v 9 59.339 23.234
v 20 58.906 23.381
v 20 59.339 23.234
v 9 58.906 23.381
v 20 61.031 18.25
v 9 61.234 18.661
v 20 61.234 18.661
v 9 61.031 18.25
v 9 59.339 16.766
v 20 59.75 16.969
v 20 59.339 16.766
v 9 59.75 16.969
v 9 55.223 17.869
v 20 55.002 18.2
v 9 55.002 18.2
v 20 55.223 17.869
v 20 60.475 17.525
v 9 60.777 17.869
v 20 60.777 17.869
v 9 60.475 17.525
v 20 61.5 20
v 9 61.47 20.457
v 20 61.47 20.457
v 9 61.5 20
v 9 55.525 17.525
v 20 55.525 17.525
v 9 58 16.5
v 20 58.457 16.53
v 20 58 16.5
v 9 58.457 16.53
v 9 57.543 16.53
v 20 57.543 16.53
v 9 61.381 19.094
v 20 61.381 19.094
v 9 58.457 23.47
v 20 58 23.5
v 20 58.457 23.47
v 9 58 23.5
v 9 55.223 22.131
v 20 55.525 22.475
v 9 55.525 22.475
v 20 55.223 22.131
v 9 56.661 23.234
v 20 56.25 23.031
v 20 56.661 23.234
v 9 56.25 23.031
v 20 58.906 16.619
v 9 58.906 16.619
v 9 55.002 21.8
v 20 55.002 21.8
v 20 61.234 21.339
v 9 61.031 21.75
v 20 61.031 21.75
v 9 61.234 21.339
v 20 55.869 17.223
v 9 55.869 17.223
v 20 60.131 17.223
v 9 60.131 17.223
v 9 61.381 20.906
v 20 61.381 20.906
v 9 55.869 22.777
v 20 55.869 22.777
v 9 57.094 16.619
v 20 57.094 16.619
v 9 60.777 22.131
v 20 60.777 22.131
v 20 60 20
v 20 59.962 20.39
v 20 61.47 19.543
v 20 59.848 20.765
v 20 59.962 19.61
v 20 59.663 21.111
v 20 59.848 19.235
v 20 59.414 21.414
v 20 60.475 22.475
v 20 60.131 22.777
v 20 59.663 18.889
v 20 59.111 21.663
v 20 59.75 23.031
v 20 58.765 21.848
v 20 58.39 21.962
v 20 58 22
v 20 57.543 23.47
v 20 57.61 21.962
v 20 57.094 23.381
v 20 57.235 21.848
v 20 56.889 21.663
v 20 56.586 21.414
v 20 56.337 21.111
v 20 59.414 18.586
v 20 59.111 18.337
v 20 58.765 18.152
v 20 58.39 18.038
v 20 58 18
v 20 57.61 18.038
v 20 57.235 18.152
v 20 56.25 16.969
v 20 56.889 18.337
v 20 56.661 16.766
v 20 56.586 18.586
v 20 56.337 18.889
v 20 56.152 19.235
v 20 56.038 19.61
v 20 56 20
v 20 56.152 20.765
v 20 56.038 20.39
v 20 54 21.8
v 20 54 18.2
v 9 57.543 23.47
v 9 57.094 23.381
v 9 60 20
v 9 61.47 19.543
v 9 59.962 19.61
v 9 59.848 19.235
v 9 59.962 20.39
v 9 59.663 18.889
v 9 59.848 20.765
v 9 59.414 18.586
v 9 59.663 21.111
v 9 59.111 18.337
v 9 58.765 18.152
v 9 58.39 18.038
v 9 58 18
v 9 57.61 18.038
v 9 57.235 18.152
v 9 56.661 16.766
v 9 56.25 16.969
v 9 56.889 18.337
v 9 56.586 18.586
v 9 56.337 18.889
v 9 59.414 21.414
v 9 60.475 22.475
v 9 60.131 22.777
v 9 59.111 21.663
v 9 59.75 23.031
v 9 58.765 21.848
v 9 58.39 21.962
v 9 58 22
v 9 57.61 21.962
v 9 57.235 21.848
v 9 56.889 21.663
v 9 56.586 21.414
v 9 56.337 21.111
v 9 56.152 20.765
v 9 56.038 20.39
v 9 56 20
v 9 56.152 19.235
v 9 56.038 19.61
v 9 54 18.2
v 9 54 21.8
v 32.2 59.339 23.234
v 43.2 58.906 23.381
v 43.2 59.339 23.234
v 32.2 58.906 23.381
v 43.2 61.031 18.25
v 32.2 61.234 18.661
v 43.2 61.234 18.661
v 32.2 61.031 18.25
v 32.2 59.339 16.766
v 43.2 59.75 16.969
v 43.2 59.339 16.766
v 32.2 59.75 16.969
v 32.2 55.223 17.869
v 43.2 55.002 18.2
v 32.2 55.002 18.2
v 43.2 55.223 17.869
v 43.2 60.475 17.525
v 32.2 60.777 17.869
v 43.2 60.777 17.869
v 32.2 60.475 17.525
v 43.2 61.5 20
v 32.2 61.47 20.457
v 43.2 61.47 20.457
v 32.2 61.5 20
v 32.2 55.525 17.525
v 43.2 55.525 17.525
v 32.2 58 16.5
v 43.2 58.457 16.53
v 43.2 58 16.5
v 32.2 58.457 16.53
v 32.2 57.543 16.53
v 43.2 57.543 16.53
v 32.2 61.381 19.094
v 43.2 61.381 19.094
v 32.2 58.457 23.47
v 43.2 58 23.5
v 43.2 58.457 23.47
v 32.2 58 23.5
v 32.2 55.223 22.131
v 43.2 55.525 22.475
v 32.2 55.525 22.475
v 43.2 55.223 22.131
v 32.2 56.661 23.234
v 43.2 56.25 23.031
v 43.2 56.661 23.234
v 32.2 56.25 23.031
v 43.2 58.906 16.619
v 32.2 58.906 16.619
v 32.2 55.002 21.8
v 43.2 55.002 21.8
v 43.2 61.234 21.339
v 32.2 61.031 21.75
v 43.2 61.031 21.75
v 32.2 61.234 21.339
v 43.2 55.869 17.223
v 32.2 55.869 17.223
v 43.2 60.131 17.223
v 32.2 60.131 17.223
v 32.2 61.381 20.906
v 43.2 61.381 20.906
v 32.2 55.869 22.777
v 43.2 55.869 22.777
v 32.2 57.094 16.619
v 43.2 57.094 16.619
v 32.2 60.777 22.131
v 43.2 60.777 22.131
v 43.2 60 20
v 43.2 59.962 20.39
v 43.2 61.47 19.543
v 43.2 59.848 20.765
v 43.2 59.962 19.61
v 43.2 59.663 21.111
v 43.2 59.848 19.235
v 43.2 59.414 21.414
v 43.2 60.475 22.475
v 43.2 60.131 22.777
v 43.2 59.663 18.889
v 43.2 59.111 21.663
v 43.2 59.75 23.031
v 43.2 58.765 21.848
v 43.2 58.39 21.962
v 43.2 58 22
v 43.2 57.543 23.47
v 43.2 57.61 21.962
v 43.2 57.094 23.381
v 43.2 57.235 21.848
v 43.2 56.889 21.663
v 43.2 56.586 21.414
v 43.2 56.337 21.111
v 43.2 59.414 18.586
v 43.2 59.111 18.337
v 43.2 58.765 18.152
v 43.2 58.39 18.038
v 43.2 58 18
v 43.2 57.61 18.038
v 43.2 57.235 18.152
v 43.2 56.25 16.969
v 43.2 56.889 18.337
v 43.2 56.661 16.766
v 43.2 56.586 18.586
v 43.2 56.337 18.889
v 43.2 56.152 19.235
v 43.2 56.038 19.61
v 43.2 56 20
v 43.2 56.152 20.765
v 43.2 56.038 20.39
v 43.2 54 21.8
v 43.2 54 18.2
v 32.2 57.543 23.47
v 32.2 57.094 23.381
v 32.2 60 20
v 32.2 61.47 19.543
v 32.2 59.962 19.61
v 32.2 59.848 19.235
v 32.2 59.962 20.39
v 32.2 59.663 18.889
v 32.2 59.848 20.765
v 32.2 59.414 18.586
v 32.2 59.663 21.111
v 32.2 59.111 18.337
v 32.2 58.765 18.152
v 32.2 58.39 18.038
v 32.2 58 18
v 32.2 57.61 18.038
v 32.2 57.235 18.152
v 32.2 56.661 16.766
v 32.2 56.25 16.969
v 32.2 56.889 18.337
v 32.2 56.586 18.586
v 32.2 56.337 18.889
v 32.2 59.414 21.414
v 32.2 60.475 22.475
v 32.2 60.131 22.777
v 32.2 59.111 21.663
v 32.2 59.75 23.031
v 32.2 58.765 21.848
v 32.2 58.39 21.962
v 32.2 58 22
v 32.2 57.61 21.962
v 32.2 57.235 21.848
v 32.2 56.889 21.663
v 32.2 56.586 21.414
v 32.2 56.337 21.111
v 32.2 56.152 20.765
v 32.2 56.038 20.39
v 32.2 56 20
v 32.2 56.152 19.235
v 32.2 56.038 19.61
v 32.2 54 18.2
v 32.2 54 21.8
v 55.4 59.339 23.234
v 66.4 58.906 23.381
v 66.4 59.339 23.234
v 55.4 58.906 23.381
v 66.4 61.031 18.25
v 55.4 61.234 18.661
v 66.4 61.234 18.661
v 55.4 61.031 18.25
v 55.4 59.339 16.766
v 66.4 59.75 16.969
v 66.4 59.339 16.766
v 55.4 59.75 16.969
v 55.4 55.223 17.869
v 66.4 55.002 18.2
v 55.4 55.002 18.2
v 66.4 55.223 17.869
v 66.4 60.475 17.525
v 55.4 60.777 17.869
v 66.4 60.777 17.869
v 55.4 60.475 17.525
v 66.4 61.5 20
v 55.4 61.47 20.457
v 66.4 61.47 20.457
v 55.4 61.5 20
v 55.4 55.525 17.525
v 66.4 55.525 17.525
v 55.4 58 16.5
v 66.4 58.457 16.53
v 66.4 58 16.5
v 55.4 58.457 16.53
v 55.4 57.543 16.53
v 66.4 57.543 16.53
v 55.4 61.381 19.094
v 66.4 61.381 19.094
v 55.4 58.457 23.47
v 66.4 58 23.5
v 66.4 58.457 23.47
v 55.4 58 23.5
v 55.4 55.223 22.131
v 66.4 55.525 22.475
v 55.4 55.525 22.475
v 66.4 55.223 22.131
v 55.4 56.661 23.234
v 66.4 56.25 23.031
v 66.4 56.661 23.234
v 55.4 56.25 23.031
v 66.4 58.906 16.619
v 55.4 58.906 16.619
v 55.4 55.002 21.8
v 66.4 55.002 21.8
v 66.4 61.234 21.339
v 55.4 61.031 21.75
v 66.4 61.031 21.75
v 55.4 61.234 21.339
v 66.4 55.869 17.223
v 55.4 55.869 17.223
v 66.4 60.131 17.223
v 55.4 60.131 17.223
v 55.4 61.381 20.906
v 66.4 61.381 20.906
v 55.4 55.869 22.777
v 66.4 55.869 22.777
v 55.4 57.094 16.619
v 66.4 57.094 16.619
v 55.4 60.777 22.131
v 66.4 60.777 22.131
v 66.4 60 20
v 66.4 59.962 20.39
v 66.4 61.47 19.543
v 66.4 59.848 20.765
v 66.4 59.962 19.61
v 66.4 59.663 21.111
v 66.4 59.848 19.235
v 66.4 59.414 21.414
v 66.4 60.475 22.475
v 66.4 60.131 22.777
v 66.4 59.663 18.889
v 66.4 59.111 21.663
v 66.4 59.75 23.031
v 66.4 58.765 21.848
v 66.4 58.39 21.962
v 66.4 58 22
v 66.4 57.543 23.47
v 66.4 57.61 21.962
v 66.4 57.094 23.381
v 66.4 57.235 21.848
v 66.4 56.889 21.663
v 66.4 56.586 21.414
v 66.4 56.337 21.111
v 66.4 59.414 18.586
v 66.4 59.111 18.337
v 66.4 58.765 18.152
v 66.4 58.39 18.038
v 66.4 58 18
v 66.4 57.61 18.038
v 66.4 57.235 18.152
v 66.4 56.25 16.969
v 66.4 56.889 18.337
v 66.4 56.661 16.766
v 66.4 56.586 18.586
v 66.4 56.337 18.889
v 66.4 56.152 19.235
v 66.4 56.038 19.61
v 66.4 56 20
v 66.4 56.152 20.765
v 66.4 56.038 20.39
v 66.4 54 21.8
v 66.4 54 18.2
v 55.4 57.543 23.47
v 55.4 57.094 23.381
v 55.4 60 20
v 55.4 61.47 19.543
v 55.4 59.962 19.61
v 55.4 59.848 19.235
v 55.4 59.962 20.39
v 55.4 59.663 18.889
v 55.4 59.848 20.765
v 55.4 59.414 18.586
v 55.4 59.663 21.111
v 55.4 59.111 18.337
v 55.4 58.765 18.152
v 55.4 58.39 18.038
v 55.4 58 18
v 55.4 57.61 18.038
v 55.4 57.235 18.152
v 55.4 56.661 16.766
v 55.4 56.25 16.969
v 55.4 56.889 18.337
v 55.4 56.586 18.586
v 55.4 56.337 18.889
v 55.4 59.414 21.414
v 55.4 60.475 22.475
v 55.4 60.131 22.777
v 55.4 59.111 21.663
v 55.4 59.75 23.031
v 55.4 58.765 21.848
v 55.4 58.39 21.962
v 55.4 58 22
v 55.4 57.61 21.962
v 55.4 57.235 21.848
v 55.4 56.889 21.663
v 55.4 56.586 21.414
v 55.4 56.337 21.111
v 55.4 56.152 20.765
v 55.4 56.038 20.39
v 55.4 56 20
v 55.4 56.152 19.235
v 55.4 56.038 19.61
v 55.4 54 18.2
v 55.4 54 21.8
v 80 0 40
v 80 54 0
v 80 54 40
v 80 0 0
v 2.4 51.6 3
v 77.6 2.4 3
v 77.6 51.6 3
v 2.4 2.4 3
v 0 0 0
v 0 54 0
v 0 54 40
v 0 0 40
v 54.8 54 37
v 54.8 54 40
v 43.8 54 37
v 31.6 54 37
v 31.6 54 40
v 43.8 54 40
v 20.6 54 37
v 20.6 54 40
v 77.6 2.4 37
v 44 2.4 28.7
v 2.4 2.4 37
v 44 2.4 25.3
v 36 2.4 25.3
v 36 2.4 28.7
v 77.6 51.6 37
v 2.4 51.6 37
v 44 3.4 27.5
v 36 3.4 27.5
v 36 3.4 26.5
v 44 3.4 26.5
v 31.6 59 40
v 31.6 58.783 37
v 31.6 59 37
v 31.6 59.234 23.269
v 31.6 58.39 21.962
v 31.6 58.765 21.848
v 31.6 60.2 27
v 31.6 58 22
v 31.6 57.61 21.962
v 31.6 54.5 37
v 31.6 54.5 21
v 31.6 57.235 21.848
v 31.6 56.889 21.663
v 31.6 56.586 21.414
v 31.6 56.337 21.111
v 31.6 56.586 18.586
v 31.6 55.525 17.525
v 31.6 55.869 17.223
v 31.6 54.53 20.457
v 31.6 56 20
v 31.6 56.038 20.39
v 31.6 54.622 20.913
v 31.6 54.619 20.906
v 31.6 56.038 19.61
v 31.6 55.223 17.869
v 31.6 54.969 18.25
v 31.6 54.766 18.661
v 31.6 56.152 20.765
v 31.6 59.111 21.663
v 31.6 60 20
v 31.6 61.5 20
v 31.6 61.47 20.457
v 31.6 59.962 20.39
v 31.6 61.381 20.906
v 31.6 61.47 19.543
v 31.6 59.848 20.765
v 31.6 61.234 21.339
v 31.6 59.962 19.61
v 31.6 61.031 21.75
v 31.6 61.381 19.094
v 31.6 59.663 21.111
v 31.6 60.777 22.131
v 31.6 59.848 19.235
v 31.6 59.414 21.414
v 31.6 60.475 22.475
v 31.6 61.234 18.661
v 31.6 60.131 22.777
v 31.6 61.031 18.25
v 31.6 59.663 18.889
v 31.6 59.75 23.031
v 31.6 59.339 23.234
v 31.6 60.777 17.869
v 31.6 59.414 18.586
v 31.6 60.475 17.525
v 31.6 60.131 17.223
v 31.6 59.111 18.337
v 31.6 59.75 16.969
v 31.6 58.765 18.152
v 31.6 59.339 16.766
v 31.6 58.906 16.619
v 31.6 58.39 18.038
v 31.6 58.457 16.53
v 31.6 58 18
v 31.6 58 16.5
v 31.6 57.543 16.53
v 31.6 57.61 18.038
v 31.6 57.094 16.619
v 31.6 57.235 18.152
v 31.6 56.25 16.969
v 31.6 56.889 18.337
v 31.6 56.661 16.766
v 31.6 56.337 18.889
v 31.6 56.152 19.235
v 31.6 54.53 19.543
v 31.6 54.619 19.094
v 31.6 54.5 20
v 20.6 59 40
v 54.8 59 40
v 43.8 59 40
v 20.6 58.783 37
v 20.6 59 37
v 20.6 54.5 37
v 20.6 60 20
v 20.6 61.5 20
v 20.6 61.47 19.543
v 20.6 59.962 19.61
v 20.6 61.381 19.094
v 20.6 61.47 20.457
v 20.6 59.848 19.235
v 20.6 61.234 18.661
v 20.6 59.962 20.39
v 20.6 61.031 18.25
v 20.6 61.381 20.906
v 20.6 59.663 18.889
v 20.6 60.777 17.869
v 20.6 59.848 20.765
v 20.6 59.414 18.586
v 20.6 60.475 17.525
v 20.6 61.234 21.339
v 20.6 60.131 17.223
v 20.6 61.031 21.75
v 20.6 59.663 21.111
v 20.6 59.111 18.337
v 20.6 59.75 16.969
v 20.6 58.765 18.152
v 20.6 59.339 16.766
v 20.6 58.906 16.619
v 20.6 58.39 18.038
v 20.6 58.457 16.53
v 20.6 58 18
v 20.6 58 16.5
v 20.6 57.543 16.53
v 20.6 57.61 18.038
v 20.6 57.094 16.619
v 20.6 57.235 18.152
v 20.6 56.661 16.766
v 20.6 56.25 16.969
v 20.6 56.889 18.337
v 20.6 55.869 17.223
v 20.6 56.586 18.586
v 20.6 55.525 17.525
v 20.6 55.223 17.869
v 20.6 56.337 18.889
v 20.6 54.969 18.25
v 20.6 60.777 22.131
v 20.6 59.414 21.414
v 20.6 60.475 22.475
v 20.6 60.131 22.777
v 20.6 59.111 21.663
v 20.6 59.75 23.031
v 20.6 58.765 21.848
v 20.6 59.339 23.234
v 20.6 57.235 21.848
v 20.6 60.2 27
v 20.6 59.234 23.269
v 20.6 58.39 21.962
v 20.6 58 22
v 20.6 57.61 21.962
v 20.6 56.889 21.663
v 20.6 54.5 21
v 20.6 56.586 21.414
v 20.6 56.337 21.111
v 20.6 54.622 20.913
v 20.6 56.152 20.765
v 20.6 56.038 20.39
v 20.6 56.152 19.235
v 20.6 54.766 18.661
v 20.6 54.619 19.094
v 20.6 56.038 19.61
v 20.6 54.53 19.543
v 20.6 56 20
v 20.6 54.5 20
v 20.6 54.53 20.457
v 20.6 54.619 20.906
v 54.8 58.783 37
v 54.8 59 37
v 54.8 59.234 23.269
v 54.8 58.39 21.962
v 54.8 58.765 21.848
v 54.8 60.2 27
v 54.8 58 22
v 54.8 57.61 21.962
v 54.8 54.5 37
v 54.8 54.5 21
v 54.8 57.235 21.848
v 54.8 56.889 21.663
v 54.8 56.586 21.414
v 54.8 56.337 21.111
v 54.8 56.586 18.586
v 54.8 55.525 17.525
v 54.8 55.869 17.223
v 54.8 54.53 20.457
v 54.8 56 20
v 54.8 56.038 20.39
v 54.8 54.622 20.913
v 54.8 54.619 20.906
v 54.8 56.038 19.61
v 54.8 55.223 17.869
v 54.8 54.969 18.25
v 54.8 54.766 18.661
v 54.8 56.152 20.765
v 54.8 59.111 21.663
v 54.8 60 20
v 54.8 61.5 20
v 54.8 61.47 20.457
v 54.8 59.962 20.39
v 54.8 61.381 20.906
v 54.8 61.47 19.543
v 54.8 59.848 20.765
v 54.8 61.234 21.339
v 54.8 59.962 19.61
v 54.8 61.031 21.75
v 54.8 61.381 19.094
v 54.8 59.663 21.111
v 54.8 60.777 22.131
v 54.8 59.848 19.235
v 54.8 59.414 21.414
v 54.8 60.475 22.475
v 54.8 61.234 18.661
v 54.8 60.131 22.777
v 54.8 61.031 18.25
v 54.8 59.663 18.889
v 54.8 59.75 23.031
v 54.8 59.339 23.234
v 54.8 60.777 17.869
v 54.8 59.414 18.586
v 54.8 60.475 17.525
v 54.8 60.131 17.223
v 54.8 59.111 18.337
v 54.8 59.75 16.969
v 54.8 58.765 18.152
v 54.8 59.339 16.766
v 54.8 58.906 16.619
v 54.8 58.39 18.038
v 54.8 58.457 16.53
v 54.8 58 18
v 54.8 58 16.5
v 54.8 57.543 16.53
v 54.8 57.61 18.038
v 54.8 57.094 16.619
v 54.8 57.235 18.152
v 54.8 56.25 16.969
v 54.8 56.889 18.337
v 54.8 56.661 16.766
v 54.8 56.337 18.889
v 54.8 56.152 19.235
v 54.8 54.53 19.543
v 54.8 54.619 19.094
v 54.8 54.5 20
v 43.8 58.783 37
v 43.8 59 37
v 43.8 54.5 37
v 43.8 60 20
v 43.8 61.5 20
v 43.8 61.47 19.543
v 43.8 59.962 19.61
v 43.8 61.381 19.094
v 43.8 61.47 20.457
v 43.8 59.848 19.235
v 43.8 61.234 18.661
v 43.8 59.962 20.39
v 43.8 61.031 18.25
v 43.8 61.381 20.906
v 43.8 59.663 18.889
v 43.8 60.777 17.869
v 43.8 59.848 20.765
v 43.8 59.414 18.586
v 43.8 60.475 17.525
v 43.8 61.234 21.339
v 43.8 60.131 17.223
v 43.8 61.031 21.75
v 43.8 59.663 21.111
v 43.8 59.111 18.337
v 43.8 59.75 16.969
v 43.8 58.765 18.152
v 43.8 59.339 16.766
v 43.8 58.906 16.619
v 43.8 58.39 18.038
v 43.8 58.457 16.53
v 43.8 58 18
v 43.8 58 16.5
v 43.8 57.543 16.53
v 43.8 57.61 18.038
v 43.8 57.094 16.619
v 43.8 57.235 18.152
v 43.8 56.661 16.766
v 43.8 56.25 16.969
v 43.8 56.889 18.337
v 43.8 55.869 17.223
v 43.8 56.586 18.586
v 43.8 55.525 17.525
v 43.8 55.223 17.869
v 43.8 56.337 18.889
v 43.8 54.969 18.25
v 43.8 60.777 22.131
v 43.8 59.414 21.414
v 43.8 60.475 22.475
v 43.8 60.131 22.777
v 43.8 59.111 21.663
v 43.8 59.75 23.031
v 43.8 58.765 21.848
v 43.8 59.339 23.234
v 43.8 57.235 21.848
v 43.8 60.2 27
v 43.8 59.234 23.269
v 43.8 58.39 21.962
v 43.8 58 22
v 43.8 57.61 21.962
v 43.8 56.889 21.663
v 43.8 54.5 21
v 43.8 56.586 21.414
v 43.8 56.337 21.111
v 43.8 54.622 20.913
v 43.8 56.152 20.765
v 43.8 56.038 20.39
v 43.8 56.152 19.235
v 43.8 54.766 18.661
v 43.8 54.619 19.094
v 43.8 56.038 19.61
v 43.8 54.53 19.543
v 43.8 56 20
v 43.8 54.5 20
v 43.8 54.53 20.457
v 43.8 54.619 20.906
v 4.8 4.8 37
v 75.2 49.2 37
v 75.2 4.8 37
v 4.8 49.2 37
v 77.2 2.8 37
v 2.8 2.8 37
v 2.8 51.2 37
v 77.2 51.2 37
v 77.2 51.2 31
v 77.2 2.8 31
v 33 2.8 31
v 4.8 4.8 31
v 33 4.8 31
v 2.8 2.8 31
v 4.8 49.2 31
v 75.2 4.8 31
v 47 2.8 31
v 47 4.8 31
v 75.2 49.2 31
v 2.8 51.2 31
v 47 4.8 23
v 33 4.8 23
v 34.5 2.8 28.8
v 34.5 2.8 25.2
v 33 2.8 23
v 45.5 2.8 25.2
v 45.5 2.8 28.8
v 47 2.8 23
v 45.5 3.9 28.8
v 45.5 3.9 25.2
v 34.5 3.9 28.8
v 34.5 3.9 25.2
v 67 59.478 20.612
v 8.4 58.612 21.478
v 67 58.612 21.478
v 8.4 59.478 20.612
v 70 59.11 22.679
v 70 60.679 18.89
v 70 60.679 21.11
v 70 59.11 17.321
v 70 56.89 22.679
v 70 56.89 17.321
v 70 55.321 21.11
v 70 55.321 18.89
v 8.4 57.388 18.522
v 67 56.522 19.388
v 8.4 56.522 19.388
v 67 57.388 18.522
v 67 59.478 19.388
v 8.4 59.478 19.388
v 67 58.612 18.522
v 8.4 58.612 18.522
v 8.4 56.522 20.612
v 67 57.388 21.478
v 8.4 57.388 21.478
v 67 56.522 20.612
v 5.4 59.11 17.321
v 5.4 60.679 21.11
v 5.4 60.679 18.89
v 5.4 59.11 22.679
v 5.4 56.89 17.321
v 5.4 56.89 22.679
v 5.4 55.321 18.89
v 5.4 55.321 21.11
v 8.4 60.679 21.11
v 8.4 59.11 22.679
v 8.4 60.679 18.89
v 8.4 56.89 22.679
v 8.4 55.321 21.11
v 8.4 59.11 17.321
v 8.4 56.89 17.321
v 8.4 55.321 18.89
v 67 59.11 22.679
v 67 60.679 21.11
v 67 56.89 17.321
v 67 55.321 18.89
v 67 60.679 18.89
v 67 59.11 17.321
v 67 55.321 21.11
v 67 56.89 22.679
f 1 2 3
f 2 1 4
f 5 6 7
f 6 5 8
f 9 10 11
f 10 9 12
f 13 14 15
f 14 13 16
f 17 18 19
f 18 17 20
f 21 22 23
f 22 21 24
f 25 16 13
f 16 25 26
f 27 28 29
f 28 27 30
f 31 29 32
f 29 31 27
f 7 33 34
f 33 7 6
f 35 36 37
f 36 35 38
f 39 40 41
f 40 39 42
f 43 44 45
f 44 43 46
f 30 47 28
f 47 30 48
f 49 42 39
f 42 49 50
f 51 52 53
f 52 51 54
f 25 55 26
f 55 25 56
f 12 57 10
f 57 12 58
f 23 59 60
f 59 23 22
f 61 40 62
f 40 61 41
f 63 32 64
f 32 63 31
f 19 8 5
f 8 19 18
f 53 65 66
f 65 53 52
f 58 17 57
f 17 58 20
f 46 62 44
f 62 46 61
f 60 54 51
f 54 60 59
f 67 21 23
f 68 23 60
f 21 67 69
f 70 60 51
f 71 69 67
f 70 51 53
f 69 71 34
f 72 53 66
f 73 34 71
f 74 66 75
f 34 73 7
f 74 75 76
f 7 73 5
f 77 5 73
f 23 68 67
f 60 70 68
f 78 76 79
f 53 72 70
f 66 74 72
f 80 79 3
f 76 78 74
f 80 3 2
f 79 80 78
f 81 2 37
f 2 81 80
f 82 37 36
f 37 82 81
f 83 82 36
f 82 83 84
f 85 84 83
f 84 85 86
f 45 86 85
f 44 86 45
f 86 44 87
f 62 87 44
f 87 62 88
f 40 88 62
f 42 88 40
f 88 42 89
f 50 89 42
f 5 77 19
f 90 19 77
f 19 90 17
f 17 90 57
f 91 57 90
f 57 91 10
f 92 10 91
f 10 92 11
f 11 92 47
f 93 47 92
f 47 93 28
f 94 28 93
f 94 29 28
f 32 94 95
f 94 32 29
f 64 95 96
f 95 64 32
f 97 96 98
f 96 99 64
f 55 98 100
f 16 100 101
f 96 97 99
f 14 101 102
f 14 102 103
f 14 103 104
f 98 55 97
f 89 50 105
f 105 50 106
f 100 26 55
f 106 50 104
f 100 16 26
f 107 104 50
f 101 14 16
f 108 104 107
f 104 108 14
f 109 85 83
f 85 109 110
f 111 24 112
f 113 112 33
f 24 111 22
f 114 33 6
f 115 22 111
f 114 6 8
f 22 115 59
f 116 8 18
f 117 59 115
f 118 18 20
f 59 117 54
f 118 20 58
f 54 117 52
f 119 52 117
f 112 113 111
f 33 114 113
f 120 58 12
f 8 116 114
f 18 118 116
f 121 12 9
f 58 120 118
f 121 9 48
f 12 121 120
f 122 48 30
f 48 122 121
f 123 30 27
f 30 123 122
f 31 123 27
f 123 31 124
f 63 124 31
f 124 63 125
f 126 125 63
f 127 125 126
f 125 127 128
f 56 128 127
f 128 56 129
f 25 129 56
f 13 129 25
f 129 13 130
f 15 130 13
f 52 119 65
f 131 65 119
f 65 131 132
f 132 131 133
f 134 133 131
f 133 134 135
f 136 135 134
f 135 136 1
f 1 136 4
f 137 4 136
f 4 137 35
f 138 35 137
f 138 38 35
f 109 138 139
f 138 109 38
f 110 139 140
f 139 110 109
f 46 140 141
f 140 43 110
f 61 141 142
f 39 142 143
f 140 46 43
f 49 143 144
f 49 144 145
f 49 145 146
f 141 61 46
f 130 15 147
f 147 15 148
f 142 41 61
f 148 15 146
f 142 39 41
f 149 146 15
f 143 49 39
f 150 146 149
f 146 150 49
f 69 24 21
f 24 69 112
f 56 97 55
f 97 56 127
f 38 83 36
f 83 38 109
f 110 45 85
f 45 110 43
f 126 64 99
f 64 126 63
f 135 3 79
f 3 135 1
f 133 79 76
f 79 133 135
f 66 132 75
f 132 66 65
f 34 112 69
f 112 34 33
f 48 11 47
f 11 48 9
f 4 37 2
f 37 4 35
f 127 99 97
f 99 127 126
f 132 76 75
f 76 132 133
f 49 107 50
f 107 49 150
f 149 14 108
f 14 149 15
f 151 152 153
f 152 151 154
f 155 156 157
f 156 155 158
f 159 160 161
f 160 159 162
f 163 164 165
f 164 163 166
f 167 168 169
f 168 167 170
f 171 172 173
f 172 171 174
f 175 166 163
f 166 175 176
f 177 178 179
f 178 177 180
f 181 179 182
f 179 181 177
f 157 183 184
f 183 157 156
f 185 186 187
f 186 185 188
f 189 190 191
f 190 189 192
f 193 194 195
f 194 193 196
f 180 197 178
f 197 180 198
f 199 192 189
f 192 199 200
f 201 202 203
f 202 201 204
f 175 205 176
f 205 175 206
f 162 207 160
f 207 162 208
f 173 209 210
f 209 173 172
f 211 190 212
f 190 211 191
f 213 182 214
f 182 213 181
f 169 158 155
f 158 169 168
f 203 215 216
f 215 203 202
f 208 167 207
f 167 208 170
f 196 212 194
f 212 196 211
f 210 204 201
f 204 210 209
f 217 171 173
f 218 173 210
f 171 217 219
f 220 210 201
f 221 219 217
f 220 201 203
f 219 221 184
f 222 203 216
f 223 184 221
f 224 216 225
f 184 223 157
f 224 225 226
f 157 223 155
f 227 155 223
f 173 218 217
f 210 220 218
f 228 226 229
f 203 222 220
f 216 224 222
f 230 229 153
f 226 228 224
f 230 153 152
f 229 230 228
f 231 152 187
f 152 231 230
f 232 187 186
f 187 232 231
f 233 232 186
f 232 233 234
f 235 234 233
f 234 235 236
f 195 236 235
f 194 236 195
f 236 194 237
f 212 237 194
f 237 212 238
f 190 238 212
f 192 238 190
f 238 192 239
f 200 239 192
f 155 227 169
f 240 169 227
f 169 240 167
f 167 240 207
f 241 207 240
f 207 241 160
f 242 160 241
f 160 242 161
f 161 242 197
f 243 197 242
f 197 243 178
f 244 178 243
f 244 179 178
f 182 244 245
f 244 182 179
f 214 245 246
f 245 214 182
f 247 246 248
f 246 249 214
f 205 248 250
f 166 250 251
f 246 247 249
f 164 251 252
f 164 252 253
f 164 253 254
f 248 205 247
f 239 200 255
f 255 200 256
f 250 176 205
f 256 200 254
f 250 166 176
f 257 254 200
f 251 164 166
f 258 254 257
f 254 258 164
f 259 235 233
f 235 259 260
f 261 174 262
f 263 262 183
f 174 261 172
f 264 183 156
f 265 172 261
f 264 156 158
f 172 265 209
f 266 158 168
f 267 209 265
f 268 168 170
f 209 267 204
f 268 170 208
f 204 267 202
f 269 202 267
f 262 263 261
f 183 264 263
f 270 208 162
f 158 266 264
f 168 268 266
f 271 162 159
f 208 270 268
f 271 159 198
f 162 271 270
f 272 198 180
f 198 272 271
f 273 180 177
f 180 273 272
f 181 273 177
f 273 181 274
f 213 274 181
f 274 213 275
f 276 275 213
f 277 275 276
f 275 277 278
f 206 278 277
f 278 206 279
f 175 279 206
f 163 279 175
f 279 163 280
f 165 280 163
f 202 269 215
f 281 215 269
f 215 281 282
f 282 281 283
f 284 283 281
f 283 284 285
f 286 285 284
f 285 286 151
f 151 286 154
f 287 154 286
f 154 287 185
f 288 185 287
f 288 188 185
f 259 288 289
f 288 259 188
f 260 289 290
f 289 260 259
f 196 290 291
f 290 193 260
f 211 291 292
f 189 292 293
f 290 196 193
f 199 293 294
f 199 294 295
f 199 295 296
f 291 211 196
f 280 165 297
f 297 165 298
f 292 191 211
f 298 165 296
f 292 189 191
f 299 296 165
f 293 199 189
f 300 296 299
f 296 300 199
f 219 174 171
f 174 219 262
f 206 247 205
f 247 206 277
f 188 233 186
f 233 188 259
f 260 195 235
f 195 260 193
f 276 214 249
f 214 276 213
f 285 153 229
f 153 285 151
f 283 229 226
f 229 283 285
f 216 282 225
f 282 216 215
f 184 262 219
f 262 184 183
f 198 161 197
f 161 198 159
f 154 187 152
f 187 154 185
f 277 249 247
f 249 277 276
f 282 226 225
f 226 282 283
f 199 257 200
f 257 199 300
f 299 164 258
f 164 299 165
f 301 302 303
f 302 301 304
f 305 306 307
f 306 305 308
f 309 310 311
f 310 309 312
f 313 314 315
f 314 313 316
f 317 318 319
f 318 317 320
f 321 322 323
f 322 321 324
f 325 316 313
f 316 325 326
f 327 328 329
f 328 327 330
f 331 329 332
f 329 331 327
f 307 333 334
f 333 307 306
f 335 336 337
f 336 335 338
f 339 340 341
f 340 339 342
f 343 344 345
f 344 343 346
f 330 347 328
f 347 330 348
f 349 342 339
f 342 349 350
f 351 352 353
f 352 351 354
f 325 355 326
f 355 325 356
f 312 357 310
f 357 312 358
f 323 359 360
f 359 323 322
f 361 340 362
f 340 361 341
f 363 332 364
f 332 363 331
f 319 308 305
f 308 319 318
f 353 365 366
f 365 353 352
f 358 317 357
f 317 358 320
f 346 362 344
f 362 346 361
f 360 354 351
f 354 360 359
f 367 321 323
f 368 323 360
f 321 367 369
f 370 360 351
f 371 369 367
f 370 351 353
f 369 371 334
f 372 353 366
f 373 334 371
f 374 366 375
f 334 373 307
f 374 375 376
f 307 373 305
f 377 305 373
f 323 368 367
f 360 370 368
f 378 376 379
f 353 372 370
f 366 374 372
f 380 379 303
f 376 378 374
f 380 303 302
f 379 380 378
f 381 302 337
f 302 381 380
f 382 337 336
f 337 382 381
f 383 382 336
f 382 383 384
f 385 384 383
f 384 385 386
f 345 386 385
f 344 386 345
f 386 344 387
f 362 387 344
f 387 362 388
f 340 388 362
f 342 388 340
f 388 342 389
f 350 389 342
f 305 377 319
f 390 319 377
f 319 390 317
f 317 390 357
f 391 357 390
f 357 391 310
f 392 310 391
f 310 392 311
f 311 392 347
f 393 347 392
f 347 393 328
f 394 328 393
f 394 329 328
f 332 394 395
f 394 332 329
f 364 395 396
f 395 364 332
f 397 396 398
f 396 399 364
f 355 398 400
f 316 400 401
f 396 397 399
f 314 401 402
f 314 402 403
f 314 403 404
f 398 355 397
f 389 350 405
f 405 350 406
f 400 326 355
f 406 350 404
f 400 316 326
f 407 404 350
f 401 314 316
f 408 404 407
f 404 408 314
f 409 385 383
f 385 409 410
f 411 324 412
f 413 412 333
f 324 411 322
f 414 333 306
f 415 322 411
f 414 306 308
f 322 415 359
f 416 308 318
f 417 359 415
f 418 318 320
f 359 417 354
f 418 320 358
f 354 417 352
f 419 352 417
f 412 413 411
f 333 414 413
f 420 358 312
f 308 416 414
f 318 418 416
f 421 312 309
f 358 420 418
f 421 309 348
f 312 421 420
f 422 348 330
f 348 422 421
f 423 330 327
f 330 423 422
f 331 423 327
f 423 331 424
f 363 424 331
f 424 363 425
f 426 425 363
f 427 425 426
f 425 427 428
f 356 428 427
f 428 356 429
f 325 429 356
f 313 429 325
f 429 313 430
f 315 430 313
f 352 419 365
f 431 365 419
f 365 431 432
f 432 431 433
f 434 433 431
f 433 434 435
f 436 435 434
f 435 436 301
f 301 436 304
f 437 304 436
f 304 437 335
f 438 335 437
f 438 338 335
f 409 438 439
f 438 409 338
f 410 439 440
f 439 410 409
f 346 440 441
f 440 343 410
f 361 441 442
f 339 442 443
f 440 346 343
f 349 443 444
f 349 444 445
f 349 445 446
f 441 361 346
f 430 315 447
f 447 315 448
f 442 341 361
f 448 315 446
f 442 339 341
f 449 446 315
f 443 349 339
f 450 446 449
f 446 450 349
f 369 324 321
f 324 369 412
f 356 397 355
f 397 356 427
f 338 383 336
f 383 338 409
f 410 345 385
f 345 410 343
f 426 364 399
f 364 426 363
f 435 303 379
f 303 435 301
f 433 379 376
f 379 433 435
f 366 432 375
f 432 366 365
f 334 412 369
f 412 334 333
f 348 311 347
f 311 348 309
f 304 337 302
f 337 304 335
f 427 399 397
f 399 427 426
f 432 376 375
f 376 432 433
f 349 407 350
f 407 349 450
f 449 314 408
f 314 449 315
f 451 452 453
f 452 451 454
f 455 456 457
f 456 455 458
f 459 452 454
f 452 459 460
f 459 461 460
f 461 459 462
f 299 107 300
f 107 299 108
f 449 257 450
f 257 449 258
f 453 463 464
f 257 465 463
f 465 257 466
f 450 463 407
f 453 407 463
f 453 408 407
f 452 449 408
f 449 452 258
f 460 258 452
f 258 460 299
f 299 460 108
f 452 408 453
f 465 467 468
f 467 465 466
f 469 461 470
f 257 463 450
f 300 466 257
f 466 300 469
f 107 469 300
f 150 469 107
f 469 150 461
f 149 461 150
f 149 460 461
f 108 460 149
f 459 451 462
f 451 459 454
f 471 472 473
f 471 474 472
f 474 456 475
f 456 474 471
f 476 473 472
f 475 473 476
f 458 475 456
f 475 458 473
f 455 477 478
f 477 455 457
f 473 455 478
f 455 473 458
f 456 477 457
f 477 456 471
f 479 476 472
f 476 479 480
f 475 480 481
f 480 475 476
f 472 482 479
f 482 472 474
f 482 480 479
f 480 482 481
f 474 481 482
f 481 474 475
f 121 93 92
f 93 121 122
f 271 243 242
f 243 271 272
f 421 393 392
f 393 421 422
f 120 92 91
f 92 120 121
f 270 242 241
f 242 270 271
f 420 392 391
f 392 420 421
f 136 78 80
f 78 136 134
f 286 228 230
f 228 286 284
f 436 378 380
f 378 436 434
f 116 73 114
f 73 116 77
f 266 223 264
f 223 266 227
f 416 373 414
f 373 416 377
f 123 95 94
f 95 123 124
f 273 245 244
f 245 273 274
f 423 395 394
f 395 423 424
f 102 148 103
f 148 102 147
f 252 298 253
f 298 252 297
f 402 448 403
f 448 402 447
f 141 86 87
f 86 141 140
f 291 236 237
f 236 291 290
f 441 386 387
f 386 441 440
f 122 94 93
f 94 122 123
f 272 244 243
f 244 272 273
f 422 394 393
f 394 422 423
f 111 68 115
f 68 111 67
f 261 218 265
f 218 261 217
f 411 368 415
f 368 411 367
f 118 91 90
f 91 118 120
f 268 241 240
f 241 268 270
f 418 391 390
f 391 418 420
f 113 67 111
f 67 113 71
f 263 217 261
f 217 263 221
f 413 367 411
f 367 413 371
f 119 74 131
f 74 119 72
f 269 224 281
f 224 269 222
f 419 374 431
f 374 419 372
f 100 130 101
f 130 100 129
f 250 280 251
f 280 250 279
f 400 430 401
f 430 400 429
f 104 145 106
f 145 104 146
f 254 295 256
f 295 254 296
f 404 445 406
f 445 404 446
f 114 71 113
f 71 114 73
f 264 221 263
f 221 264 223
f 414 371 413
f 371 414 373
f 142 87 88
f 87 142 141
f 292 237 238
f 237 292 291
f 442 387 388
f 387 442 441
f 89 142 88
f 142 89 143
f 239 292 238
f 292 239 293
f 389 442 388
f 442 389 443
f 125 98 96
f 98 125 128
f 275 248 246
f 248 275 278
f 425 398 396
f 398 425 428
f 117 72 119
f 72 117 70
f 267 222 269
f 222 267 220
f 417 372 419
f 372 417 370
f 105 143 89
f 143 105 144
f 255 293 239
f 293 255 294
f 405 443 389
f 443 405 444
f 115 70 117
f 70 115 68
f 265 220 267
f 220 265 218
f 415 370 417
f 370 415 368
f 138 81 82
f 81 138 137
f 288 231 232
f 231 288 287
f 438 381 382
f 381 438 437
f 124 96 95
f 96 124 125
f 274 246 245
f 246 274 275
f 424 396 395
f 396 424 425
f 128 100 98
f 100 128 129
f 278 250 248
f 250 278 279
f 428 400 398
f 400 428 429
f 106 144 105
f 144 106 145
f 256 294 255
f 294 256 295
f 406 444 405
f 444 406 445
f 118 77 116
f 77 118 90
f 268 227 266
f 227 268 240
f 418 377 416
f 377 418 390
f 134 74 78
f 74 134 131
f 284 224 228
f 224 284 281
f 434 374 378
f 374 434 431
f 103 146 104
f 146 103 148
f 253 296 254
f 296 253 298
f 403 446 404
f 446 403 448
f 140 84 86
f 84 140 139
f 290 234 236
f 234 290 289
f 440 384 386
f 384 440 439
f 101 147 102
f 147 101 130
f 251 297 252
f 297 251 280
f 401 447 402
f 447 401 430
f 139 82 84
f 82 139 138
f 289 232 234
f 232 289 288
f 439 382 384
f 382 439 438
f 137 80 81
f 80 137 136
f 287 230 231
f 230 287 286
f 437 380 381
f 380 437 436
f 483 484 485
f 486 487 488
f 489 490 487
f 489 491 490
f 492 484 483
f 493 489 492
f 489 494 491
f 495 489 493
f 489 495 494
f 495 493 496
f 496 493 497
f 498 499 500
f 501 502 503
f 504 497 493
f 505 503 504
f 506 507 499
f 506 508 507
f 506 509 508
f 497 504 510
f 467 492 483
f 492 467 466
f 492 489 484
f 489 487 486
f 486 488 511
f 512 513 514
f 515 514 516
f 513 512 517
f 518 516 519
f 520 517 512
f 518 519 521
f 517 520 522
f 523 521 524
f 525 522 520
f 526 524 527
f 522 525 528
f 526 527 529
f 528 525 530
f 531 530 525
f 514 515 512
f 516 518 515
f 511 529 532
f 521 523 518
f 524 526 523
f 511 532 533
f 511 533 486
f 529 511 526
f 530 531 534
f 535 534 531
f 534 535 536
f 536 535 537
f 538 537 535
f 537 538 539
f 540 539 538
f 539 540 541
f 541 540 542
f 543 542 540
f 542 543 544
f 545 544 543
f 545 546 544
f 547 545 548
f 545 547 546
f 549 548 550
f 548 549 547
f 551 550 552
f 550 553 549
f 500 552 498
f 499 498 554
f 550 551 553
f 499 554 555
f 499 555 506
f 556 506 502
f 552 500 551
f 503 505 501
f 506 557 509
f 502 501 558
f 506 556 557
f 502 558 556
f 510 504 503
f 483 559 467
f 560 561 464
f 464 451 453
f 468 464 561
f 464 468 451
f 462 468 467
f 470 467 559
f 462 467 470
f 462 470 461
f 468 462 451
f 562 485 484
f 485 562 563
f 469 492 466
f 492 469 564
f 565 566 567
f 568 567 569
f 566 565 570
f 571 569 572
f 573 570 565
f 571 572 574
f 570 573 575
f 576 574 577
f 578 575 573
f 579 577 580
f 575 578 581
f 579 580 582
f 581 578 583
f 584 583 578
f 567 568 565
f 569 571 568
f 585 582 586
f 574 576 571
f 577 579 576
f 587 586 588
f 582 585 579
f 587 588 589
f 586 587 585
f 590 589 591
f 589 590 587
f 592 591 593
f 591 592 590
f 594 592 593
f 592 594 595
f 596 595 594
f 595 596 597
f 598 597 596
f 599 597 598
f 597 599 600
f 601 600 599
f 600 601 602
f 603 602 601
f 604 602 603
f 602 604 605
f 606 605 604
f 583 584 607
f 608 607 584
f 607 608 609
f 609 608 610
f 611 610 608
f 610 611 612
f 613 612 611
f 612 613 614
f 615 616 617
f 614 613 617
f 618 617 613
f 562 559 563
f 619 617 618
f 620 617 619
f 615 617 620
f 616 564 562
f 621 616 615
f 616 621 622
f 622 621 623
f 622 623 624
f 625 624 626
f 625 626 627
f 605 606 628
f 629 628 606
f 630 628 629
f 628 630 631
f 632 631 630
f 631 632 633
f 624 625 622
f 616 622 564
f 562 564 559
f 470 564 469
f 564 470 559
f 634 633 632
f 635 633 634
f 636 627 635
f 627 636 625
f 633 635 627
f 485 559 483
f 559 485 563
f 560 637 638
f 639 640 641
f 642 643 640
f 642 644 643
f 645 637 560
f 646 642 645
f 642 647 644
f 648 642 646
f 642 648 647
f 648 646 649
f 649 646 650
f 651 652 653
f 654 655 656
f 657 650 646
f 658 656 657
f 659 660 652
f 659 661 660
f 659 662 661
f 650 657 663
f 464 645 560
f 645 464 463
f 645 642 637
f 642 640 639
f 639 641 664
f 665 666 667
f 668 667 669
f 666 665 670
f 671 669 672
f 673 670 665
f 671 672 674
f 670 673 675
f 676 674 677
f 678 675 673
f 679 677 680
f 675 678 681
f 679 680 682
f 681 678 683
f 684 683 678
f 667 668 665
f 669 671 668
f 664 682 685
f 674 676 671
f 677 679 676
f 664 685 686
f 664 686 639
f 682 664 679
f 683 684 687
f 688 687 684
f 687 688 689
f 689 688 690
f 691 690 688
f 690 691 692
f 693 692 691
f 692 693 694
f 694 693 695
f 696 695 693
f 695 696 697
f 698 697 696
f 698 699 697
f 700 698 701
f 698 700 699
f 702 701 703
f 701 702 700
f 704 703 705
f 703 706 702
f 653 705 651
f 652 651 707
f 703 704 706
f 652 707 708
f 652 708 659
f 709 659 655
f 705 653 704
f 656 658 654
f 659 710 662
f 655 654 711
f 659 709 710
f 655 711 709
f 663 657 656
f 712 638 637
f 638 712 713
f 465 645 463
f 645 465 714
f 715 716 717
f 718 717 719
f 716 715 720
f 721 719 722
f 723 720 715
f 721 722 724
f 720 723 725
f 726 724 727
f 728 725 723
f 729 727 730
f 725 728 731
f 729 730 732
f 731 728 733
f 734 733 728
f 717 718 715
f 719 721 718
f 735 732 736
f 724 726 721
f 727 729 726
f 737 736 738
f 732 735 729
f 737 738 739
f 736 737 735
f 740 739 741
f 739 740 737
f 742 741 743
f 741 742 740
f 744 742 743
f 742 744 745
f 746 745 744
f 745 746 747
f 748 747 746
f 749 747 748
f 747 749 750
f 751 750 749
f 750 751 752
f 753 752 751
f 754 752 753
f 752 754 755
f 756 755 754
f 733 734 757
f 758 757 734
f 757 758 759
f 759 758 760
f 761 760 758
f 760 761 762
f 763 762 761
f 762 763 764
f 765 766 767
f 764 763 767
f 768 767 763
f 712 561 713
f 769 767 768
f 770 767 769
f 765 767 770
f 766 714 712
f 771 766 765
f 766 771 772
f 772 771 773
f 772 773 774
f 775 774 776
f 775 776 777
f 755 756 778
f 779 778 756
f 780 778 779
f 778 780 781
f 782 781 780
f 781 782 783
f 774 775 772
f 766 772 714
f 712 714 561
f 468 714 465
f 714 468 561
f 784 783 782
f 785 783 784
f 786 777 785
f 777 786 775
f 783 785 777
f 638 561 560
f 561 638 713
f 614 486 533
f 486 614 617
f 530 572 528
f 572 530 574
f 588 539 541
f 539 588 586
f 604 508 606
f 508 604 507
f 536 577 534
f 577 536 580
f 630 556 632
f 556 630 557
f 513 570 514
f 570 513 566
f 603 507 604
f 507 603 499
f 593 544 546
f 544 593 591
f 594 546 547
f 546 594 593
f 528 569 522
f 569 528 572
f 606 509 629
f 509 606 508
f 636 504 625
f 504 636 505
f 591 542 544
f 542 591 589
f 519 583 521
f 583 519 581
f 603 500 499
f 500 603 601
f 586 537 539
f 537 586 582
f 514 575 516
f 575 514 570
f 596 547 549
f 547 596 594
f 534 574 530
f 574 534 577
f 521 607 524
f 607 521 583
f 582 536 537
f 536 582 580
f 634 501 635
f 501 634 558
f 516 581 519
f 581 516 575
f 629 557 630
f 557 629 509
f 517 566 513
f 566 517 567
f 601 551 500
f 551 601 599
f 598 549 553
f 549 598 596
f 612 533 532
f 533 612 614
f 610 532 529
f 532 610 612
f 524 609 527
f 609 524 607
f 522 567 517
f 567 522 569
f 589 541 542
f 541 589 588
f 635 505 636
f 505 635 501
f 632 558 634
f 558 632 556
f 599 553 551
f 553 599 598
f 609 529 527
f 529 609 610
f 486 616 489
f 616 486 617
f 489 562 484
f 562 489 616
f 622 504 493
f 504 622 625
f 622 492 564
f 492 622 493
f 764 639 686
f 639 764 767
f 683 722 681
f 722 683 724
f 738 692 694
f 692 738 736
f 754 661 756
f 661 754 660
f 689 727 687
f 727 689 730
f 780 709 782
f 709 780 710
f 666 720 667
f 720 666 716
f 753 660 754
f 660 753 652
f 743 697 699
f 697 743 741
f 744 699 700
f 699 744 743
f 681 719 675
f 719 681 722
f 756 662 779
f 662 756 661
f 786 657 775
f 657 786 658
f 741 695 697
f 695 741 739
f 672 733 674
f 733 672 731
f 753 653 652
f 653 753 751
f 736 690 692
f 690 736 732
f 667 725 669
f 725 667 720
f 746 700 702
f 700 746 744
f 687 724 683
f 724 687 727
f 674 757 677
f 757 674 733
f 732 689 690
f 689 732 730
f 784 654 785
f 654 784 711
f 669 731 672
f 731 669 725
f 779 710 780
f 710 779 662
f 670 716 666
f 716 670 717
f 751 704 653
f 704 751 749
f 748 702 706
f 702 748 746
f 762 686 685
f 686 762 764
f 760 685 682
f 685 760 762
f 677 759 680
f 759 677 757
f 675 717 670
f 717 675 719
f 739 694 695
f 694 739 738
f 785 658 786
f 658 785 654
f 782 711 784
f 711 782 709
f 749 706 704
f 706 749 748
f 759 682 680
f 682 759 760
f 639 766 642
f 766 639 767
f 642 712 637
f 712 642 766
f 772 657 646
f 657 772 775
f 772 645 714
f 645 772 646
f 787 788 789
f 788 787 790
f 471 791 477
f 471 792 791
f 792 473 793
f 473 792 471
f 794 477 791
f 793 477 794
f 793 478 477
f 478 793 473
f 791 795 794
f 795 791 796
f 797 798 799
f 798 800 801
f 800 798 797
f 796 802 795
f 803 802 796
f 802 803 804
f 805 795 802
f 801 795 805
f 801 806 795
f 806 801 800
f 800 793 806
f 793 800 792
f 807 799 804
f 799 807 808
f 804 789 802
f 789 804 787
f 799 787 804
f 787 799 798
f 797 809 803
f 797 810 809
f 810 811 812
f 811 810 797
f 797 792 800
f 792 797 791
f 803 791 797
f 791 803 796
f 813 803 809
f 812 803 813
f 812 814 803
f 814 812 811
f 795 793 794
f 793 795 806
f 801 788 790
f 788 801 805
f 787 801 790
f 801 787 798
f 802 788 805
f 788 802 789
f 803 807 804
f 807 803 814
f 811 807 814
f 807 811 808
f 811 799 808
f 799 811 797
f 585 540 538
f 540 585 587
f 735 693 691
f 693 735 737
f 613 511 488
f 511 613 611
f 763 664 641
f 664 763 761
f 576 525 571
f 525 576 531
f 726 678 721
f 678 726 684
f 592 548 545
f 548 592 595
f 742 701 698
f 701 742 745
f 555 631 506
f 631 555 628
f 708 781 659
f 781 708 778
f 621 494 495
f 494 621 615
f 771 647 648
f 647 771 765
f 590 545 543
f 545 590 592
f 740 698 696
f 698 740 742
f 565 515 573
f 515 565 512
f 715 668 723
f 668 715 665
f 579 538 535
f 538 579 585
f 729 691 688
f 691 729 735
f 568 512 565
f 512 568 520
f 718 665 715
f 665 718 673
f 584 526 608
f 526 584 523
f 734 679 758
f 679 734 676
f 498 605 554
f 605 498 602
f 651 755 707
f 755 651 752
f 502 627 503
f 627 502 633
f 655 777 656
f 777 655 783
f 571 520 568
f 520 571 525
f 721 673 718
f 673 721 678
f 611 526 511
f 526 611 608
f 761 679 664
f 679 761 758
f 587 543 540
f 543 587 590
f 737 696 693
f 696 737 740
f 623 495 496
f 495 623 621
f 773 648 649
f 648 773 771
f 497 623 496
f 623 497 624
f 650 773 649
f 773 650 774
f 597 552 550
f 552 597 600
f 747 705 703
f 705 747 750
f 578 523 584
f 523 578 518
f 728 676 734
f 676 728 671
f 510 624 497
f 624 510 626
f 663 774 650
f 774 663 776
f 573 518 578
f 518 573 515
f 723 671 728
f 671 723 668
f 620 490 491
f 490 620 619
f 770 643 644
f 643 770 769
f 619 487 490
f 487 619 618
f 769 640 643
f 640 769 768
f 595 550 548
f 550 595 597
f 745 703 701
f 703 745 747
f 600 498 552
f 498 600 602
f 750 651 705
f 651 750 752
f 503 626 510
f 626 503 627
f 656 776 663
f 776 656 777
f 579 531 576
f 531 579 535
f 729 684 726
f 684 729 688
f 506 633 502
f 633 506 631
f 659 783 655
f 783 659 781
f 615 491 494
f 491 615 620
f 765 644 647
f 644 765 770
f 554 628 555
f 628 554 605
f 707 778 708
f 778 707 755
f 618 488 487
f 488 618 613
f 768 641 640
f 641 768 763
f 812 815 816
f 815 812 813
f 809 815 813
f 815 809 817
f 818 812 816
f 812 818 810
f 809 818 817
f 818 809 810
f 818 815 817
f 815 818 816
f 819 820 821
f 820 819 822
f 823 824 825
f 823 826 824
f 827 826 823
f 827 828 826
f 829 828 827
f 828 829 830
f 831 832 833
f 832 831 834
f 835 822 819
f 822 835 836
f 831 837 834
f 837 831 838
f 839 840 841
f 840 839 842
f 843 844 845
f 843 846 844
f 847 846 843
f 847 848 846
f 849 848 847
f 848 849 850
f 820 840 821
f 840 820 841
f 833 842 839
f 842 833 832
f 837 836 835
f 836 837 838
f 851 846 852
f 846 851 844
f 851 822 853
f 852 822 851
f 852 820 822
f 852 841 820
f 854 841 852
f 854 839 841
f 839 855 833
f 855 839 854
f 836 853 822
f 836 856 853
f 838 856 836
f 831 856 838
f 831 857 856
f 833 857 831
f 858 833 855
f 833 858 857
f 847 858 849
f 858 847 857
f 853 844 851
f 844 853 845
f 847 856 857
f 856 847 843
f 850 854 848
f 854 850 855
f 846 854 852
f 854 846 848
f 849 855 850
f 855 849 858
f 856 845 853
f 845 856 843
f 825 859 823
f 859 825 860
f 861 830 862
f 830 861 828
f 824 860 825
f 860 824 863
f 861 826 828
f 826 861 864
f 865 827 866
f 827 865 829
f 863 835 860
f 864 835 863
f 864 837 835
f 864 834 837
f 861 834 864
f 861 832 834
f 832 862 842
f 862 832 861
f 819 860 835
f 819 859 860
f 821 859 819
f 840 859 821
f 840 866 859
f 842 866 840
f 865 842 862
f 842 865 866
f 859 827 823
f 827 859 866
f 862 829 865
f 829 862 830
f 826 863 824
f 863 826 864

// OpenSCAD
// Box with print-in-place hinge
// Closed body 80 (x) x 54 (y body, 61.5 incl. hinge) x 40 (z) mm.
// Lid occupies the top 10 mm. Hinge pin axis: y=58, z=20 (mid-height at the
// back), so swinging the lid -180 deg about that axis lays the lid flat on
// the bed behind the box: that is the print-in-place pose.
// Clearances (PLA, 0.4 nozzle): pin/bore 0.40 radial, knuckle axial gaps
// 0.6, lid lip to box walls 0.4, lid barrels to box back wall 0.5.

part = "assembly"; // ["assembly", "box", "lid", "pin"]
cadverify_only = "";

W = 80; D = 54; H = 40; box_h = 30;
wall = 2.4; floor_t = 3; plate_t = 3;
hinge_y = 58; hinge_z = 20;
barrel_r = 3.5; bore_r = 2.0; pin_r = 1.6; cap_r = 2.9;
hinge_ymax = hinge_y + barrel_r;          // 61.5
box_segs  = [[9, 11], [32.2, 11], [55.4, 11]];   // [x0, len]
lid_segs  = [[20.6, 11], [43.8, 11]];
pin_x0 = 5.4; pin_len = 64.6;

module instance(name, partname, unit = 1) {
    echo(cadverify_instance = [name, partname, unit]);
    if (cadverify_only == "" || cadverify_only == name) children();
}

// Extrude a (y,z) profile along +x starting at x0, offset by (oy,oz).
module extrude_yz(profile, x0, len, oy = 0, oz = 0) {
    multmatrix([[0,0,1,x0],[1,0,0,oy],[0,1,0,oz],[0,0,0,1]])
        linear_extrude(height = len) polygon(points = profile);
}

module barrel(x0, len) {
    translate([x0, hinge_y, hinge_z]) rotate([0, 90, 0])
        cylinder(h = len, r = barrel_r, $fn = 48);
}

module bore_cut() {
    translate([4, hinge_y, hinge_z]) rotate([0, 90, 0])
        cylinder(h = 72, r = bore_r, $fn = 32);
}

module box_closed() {
    difference() {
        union() {
            // floor and walls up to z=30
            translate([0, 0, 0]) cube([W, D, floor_t]);
            translate([0, 0, floor_t]) cube([W, wall, box_h - floor_t]);              // front
            translate([0, D - wall, floor_t]) cube([W, wall, box_h - floor_t]);       // back
            translate([0, wall, floor_t]) cube([wall, D - 2*wall, box_h - floor_t]);  // left
            translate([W - wall, wall, floor_t]) cube([wall, D - 2*wall, box_h - floor_t]); // right
            // front catch detent bump on the inner front wall (wedged ridge)
            extrude_yz([[2.4,25.3],[3.4,26.5],[3.4,27.5],[2.4,28.7]], 36, 8);
            // hinge knuckles + arms to the back wall
            for (s = box_segs) {
                barrel(s[0], s[1]);
                translate([s[0], 53.5, hinge_z - 1.8]) cube([s[1], 5, 3.6]);
            }
        }
        bore_cut();
    }
}

module lid_closed() {
    difference() {
        union() {
            // top plate + back hinge tabs
            translate([0, 0, H - plate_t]) cube([W, D, plate_t]);
            for (s = lid_segs) translate([s[0], 53, H - plate_t]) cube([s[1], 6, plate_t]);
            // external skirt (down to z=30, flush with box walls outside)
            translate([0, 0, box_h]) cube([W, wall, H - plate_t - box_h]);                  // front
            translate([0, D - wall, box_h]) cube([W, wall, H - plate_t - box_h]);           // back
            translate([0, wall, box_h]) cube([wall, D - 2*wall, H - plate_t - box_h]);      // left
            translate([W - wall, wall, box_h]) cube([wall, D - 2*wall, H - plate_t - box_h]); // right
            // inner sealing lip (0.4 clear of box inner walls)
            translate([2.8, 2.8, 31]) cube([74.4, 2, 6]);        // front lip
            translate([2.8, 49.2, 31]) cube([74.4, 2, 6]);       // back lip
            translate([2.8, 4.8, 31]) cube([2, 44.4, 6]);        // left lip
            translate([75.2, 4.8, 31]) cube([2, 44.4, 6]);       // right lip
            // central catch tongue on the front lip, reaching down to z=23
            translate([33, 2.8, 23]) cube([14, 2, 8]);
            // hinge knuckles + diagonal straps up to the plate tabs
            for (s = lid_segs) {
                barrel(s[0], s[1]);
                extrude_yz([[54.5,39],[58.5,39],[60.2,27],[58,18.5],[54.5,21]], s[0], s[1]);
            }
        }
        bore_cut();
        // catch groove in the tongue (receives the box detent bump when shut)
        translate([34.5, 2.7, 25.2]) cube([11, 1.2, 3.6]);
        // fingernail scoop in the front skirt bottom edge
        translate([40, -1, box_h]) rotate([90, 0, 0]) cylinder(h = 4, r = 4.5, $fn = 32);
    }
}

function oct_pts(r) = [for (i = [0:7]) let (a = 22.5 + 45*i) [r*cos(a), r*sin(a)]];

module pin_closed() {
    // stepped octagonal axle (flats top/bottom), captive caps both ends
    extrude_yz(oct_pts(pin_r), pin_x0, pin_len, hinge_y, hinge_z);
    extrude_yz(oct_pts(cap_r), pin_x0, 3, hinge_y, hinge_z);
    extrude_yz(oct_pts(cap_r), pin_x0 + pin_len - 3, 3, hinge_y, hinge_z);
}

// --- printed (as-exported) orientations ---
module lid_printed() {
    // closed lid rotated 180 deg about the hinge axis, then dropped to y=0
    translate([0, hinge_ymax, H]) rotate([180, 0, 0]) lid_closed();
}
pin_off = cap_r * cos(22.5); // 2.679 half-height of the octagonal caps
module pin_printed() {
    translate([-pin_x0, -(hinge_y - pin_off), -(hinge_z - pin_off)]) pin_closed();
}

box_spec = [
    ["bounds", [[0, 0, 0], [W, hinge_ymax, box_h]]],
    ["bodies", 1],
    ["support_faces", [["bed", "-z", 4000]]],
    ["overhangs_allowed", [
        ["hinge barrels and arms: horizontal print-in-place axle housings, bore is self-supported inside the tube", [[8, 53, 16], [67.5, 62, 24]]]
    ]],
    ["copies", 1],
    ["details", [
        ["floor", "material", [[10, 10, 0.5], [70, 44, 2.5]], 0.98],
        ["interior", "void", [[6, 6, 8], [74, 48, 24]], 0.98],
        ["front_wall", "thickness", [40, -1, 15], [0, 1, 0], 2.4],
        ["knuckle_arm", "material", [[10, 54.5, 18.6], [19, 57.5, 21.4]], 0.9],
        ["hinge_bore", "void", [[10, 56.7, 18.7], [19, 59.3, 21.3]], 1.0],
        ["catch_bump", "material", [[37, 2.6, 26.6], [43, 3.3, 27.4]], 0.85],
        ["catch_bump_view", "view", [[35, 2, 24], [45, 4.5, 29.5]]],
        ["hinge_view", "view", [[8, 53, 15], [67, 62, 25]]]
    ]]
];

lid_spec = [
    ["bounds", [[0, 0, 0], [W, hinge_ymax, 23.5]]],
    ["bodies", 1],
    ["support_faces", [["bed", "-z", 4000]]],
    ["overhangs_allowed", [
        ["hinge barrels and straps: horizontal print-in-place axle housings", [[20, 0, 0], [55.5, 8, 24]]],
        ["catch groove underside in print pose", [[34, 56, 11], [46, 59, 15]]]
    ]],
    ["copies", 1],
    ["details", [
        ["top_plate", "material", [[10, 17.5, 0.5], [70, 51.5, 2.5]], 0.98],
        ["front_skirt", "material", [[10, 59.3, 4.5], [70, 61.3, 7.5]], 0.9],
        ["plate_thickness", "thickness", [40, 30, -1], [0, 0, 1], 3],
        ["tongue", "material", [[38, 57, 9.2], [42, 58.5, 10.3]], 0.85],
        ["catch_groove", "void", [[37, 57.7, 12], [43, 58.5, 14]], 1.0],
        ["hinge_bore", "void", [[23, 2.2, 18.7], [29, 4.8, 21.3]], 1.0],
        ["strap", "material", [[23, 3.5, 8], [29, 6.5, 12]], 0.8],
        ["catch_groove_view", "view", [[33, 56.5, 9], [47, 59, 17]]],
        ["lid_knuckle_view", "view", [[20, 0, 16], [32, 8, 24]]]
    ]]
];

pin_spec = [
    ["bounds", [[0, 0, 0], [pin_len, 2*pin_off, 2*pin_off]]],
    ["bodies", 1],
    ["support_faces", [["bed", "-z", 70]]],
    ["overhangs_allowed", [
        ["lower facets of the horizontal print-in-place axle, 0.4 above the bore that supports it", [[-0.1, -0.1, -0.1], [64.7, 5.5, 1.6]]]
    ]],
    ["copies", 1],
    ["details", [
        ["shaft", "material", [[10, 1.8, 1.8], [50, 3.55, 3.55]], 0.9],
        ["cap", "material", [[0.5, 1.0, 1.0], [2.5, 4.35, 4.35]], 0.7],
        ["cap_thickness", "thickness", [1.5, pin_off, -1], [0, 0, 1], 5.358],
        ["pin_end_view", "view", [[0, 0, 0], [3, 5.36, 5.36]]]
    ]]
];

assembly_spec = [
    ["bounds", [[0, 0, 0], [W, hinge_ymax, H]]],
    ["support_faces", [["table", "-z", 4000]]],
    ["motions", [
        ["lid_swing", ["lid"], "rotate", [0, hinge_y, hinge_z], [1, 0, 0], [-180, 0],
            ["flex", [["lid", "box", 1.0, "front catch tongue snaps 0.6 mm over the detent bump while closing"]]]]
    ]],
    ["print_in_place", 0.4],
    ["print_pose", [["lid_swing", -180]]],
    ["overhangs_allowed", [
        ["box hinge barrels in print pose", [[8, 53, 16], [67.5, 62, 24]]],
        ["lid hinge barrels and straps in print pose", [[20, 53, 0], [56, 62, 24]]],
        ["horizontal pin inside its bore, 0.4 above the bore surface", [[5, 55, 16.5], [70.5, 61, 20]]],
        ["lid catch groove in print pose", [[33, 110, 2], [47, 114, 18]]]
    ]]
];

if (part == "box") {
    echo(cadverify_spec = box_spec);
    box_closed();
} else if (part == "lid") {
    echo(cadverify_spec = lid_spec);
    lid_printed();
} else if (part == "pin") {
    echo(cadverify_spec = pin_spec);
    pin_printed();
} else {
    echo(cadverify_spec = assembly_spec);
    instance("box", "box") box_closed();
    instance("lid", "lid")
        translate([0, hinge_ymax, H]) rotate([180, 0, 0]) lid_printed();
    instance("pin", "pin")
        translate([pin_x0, hinge_y - pin_off, hinge_z - pin_off]) pin_printed();
}
